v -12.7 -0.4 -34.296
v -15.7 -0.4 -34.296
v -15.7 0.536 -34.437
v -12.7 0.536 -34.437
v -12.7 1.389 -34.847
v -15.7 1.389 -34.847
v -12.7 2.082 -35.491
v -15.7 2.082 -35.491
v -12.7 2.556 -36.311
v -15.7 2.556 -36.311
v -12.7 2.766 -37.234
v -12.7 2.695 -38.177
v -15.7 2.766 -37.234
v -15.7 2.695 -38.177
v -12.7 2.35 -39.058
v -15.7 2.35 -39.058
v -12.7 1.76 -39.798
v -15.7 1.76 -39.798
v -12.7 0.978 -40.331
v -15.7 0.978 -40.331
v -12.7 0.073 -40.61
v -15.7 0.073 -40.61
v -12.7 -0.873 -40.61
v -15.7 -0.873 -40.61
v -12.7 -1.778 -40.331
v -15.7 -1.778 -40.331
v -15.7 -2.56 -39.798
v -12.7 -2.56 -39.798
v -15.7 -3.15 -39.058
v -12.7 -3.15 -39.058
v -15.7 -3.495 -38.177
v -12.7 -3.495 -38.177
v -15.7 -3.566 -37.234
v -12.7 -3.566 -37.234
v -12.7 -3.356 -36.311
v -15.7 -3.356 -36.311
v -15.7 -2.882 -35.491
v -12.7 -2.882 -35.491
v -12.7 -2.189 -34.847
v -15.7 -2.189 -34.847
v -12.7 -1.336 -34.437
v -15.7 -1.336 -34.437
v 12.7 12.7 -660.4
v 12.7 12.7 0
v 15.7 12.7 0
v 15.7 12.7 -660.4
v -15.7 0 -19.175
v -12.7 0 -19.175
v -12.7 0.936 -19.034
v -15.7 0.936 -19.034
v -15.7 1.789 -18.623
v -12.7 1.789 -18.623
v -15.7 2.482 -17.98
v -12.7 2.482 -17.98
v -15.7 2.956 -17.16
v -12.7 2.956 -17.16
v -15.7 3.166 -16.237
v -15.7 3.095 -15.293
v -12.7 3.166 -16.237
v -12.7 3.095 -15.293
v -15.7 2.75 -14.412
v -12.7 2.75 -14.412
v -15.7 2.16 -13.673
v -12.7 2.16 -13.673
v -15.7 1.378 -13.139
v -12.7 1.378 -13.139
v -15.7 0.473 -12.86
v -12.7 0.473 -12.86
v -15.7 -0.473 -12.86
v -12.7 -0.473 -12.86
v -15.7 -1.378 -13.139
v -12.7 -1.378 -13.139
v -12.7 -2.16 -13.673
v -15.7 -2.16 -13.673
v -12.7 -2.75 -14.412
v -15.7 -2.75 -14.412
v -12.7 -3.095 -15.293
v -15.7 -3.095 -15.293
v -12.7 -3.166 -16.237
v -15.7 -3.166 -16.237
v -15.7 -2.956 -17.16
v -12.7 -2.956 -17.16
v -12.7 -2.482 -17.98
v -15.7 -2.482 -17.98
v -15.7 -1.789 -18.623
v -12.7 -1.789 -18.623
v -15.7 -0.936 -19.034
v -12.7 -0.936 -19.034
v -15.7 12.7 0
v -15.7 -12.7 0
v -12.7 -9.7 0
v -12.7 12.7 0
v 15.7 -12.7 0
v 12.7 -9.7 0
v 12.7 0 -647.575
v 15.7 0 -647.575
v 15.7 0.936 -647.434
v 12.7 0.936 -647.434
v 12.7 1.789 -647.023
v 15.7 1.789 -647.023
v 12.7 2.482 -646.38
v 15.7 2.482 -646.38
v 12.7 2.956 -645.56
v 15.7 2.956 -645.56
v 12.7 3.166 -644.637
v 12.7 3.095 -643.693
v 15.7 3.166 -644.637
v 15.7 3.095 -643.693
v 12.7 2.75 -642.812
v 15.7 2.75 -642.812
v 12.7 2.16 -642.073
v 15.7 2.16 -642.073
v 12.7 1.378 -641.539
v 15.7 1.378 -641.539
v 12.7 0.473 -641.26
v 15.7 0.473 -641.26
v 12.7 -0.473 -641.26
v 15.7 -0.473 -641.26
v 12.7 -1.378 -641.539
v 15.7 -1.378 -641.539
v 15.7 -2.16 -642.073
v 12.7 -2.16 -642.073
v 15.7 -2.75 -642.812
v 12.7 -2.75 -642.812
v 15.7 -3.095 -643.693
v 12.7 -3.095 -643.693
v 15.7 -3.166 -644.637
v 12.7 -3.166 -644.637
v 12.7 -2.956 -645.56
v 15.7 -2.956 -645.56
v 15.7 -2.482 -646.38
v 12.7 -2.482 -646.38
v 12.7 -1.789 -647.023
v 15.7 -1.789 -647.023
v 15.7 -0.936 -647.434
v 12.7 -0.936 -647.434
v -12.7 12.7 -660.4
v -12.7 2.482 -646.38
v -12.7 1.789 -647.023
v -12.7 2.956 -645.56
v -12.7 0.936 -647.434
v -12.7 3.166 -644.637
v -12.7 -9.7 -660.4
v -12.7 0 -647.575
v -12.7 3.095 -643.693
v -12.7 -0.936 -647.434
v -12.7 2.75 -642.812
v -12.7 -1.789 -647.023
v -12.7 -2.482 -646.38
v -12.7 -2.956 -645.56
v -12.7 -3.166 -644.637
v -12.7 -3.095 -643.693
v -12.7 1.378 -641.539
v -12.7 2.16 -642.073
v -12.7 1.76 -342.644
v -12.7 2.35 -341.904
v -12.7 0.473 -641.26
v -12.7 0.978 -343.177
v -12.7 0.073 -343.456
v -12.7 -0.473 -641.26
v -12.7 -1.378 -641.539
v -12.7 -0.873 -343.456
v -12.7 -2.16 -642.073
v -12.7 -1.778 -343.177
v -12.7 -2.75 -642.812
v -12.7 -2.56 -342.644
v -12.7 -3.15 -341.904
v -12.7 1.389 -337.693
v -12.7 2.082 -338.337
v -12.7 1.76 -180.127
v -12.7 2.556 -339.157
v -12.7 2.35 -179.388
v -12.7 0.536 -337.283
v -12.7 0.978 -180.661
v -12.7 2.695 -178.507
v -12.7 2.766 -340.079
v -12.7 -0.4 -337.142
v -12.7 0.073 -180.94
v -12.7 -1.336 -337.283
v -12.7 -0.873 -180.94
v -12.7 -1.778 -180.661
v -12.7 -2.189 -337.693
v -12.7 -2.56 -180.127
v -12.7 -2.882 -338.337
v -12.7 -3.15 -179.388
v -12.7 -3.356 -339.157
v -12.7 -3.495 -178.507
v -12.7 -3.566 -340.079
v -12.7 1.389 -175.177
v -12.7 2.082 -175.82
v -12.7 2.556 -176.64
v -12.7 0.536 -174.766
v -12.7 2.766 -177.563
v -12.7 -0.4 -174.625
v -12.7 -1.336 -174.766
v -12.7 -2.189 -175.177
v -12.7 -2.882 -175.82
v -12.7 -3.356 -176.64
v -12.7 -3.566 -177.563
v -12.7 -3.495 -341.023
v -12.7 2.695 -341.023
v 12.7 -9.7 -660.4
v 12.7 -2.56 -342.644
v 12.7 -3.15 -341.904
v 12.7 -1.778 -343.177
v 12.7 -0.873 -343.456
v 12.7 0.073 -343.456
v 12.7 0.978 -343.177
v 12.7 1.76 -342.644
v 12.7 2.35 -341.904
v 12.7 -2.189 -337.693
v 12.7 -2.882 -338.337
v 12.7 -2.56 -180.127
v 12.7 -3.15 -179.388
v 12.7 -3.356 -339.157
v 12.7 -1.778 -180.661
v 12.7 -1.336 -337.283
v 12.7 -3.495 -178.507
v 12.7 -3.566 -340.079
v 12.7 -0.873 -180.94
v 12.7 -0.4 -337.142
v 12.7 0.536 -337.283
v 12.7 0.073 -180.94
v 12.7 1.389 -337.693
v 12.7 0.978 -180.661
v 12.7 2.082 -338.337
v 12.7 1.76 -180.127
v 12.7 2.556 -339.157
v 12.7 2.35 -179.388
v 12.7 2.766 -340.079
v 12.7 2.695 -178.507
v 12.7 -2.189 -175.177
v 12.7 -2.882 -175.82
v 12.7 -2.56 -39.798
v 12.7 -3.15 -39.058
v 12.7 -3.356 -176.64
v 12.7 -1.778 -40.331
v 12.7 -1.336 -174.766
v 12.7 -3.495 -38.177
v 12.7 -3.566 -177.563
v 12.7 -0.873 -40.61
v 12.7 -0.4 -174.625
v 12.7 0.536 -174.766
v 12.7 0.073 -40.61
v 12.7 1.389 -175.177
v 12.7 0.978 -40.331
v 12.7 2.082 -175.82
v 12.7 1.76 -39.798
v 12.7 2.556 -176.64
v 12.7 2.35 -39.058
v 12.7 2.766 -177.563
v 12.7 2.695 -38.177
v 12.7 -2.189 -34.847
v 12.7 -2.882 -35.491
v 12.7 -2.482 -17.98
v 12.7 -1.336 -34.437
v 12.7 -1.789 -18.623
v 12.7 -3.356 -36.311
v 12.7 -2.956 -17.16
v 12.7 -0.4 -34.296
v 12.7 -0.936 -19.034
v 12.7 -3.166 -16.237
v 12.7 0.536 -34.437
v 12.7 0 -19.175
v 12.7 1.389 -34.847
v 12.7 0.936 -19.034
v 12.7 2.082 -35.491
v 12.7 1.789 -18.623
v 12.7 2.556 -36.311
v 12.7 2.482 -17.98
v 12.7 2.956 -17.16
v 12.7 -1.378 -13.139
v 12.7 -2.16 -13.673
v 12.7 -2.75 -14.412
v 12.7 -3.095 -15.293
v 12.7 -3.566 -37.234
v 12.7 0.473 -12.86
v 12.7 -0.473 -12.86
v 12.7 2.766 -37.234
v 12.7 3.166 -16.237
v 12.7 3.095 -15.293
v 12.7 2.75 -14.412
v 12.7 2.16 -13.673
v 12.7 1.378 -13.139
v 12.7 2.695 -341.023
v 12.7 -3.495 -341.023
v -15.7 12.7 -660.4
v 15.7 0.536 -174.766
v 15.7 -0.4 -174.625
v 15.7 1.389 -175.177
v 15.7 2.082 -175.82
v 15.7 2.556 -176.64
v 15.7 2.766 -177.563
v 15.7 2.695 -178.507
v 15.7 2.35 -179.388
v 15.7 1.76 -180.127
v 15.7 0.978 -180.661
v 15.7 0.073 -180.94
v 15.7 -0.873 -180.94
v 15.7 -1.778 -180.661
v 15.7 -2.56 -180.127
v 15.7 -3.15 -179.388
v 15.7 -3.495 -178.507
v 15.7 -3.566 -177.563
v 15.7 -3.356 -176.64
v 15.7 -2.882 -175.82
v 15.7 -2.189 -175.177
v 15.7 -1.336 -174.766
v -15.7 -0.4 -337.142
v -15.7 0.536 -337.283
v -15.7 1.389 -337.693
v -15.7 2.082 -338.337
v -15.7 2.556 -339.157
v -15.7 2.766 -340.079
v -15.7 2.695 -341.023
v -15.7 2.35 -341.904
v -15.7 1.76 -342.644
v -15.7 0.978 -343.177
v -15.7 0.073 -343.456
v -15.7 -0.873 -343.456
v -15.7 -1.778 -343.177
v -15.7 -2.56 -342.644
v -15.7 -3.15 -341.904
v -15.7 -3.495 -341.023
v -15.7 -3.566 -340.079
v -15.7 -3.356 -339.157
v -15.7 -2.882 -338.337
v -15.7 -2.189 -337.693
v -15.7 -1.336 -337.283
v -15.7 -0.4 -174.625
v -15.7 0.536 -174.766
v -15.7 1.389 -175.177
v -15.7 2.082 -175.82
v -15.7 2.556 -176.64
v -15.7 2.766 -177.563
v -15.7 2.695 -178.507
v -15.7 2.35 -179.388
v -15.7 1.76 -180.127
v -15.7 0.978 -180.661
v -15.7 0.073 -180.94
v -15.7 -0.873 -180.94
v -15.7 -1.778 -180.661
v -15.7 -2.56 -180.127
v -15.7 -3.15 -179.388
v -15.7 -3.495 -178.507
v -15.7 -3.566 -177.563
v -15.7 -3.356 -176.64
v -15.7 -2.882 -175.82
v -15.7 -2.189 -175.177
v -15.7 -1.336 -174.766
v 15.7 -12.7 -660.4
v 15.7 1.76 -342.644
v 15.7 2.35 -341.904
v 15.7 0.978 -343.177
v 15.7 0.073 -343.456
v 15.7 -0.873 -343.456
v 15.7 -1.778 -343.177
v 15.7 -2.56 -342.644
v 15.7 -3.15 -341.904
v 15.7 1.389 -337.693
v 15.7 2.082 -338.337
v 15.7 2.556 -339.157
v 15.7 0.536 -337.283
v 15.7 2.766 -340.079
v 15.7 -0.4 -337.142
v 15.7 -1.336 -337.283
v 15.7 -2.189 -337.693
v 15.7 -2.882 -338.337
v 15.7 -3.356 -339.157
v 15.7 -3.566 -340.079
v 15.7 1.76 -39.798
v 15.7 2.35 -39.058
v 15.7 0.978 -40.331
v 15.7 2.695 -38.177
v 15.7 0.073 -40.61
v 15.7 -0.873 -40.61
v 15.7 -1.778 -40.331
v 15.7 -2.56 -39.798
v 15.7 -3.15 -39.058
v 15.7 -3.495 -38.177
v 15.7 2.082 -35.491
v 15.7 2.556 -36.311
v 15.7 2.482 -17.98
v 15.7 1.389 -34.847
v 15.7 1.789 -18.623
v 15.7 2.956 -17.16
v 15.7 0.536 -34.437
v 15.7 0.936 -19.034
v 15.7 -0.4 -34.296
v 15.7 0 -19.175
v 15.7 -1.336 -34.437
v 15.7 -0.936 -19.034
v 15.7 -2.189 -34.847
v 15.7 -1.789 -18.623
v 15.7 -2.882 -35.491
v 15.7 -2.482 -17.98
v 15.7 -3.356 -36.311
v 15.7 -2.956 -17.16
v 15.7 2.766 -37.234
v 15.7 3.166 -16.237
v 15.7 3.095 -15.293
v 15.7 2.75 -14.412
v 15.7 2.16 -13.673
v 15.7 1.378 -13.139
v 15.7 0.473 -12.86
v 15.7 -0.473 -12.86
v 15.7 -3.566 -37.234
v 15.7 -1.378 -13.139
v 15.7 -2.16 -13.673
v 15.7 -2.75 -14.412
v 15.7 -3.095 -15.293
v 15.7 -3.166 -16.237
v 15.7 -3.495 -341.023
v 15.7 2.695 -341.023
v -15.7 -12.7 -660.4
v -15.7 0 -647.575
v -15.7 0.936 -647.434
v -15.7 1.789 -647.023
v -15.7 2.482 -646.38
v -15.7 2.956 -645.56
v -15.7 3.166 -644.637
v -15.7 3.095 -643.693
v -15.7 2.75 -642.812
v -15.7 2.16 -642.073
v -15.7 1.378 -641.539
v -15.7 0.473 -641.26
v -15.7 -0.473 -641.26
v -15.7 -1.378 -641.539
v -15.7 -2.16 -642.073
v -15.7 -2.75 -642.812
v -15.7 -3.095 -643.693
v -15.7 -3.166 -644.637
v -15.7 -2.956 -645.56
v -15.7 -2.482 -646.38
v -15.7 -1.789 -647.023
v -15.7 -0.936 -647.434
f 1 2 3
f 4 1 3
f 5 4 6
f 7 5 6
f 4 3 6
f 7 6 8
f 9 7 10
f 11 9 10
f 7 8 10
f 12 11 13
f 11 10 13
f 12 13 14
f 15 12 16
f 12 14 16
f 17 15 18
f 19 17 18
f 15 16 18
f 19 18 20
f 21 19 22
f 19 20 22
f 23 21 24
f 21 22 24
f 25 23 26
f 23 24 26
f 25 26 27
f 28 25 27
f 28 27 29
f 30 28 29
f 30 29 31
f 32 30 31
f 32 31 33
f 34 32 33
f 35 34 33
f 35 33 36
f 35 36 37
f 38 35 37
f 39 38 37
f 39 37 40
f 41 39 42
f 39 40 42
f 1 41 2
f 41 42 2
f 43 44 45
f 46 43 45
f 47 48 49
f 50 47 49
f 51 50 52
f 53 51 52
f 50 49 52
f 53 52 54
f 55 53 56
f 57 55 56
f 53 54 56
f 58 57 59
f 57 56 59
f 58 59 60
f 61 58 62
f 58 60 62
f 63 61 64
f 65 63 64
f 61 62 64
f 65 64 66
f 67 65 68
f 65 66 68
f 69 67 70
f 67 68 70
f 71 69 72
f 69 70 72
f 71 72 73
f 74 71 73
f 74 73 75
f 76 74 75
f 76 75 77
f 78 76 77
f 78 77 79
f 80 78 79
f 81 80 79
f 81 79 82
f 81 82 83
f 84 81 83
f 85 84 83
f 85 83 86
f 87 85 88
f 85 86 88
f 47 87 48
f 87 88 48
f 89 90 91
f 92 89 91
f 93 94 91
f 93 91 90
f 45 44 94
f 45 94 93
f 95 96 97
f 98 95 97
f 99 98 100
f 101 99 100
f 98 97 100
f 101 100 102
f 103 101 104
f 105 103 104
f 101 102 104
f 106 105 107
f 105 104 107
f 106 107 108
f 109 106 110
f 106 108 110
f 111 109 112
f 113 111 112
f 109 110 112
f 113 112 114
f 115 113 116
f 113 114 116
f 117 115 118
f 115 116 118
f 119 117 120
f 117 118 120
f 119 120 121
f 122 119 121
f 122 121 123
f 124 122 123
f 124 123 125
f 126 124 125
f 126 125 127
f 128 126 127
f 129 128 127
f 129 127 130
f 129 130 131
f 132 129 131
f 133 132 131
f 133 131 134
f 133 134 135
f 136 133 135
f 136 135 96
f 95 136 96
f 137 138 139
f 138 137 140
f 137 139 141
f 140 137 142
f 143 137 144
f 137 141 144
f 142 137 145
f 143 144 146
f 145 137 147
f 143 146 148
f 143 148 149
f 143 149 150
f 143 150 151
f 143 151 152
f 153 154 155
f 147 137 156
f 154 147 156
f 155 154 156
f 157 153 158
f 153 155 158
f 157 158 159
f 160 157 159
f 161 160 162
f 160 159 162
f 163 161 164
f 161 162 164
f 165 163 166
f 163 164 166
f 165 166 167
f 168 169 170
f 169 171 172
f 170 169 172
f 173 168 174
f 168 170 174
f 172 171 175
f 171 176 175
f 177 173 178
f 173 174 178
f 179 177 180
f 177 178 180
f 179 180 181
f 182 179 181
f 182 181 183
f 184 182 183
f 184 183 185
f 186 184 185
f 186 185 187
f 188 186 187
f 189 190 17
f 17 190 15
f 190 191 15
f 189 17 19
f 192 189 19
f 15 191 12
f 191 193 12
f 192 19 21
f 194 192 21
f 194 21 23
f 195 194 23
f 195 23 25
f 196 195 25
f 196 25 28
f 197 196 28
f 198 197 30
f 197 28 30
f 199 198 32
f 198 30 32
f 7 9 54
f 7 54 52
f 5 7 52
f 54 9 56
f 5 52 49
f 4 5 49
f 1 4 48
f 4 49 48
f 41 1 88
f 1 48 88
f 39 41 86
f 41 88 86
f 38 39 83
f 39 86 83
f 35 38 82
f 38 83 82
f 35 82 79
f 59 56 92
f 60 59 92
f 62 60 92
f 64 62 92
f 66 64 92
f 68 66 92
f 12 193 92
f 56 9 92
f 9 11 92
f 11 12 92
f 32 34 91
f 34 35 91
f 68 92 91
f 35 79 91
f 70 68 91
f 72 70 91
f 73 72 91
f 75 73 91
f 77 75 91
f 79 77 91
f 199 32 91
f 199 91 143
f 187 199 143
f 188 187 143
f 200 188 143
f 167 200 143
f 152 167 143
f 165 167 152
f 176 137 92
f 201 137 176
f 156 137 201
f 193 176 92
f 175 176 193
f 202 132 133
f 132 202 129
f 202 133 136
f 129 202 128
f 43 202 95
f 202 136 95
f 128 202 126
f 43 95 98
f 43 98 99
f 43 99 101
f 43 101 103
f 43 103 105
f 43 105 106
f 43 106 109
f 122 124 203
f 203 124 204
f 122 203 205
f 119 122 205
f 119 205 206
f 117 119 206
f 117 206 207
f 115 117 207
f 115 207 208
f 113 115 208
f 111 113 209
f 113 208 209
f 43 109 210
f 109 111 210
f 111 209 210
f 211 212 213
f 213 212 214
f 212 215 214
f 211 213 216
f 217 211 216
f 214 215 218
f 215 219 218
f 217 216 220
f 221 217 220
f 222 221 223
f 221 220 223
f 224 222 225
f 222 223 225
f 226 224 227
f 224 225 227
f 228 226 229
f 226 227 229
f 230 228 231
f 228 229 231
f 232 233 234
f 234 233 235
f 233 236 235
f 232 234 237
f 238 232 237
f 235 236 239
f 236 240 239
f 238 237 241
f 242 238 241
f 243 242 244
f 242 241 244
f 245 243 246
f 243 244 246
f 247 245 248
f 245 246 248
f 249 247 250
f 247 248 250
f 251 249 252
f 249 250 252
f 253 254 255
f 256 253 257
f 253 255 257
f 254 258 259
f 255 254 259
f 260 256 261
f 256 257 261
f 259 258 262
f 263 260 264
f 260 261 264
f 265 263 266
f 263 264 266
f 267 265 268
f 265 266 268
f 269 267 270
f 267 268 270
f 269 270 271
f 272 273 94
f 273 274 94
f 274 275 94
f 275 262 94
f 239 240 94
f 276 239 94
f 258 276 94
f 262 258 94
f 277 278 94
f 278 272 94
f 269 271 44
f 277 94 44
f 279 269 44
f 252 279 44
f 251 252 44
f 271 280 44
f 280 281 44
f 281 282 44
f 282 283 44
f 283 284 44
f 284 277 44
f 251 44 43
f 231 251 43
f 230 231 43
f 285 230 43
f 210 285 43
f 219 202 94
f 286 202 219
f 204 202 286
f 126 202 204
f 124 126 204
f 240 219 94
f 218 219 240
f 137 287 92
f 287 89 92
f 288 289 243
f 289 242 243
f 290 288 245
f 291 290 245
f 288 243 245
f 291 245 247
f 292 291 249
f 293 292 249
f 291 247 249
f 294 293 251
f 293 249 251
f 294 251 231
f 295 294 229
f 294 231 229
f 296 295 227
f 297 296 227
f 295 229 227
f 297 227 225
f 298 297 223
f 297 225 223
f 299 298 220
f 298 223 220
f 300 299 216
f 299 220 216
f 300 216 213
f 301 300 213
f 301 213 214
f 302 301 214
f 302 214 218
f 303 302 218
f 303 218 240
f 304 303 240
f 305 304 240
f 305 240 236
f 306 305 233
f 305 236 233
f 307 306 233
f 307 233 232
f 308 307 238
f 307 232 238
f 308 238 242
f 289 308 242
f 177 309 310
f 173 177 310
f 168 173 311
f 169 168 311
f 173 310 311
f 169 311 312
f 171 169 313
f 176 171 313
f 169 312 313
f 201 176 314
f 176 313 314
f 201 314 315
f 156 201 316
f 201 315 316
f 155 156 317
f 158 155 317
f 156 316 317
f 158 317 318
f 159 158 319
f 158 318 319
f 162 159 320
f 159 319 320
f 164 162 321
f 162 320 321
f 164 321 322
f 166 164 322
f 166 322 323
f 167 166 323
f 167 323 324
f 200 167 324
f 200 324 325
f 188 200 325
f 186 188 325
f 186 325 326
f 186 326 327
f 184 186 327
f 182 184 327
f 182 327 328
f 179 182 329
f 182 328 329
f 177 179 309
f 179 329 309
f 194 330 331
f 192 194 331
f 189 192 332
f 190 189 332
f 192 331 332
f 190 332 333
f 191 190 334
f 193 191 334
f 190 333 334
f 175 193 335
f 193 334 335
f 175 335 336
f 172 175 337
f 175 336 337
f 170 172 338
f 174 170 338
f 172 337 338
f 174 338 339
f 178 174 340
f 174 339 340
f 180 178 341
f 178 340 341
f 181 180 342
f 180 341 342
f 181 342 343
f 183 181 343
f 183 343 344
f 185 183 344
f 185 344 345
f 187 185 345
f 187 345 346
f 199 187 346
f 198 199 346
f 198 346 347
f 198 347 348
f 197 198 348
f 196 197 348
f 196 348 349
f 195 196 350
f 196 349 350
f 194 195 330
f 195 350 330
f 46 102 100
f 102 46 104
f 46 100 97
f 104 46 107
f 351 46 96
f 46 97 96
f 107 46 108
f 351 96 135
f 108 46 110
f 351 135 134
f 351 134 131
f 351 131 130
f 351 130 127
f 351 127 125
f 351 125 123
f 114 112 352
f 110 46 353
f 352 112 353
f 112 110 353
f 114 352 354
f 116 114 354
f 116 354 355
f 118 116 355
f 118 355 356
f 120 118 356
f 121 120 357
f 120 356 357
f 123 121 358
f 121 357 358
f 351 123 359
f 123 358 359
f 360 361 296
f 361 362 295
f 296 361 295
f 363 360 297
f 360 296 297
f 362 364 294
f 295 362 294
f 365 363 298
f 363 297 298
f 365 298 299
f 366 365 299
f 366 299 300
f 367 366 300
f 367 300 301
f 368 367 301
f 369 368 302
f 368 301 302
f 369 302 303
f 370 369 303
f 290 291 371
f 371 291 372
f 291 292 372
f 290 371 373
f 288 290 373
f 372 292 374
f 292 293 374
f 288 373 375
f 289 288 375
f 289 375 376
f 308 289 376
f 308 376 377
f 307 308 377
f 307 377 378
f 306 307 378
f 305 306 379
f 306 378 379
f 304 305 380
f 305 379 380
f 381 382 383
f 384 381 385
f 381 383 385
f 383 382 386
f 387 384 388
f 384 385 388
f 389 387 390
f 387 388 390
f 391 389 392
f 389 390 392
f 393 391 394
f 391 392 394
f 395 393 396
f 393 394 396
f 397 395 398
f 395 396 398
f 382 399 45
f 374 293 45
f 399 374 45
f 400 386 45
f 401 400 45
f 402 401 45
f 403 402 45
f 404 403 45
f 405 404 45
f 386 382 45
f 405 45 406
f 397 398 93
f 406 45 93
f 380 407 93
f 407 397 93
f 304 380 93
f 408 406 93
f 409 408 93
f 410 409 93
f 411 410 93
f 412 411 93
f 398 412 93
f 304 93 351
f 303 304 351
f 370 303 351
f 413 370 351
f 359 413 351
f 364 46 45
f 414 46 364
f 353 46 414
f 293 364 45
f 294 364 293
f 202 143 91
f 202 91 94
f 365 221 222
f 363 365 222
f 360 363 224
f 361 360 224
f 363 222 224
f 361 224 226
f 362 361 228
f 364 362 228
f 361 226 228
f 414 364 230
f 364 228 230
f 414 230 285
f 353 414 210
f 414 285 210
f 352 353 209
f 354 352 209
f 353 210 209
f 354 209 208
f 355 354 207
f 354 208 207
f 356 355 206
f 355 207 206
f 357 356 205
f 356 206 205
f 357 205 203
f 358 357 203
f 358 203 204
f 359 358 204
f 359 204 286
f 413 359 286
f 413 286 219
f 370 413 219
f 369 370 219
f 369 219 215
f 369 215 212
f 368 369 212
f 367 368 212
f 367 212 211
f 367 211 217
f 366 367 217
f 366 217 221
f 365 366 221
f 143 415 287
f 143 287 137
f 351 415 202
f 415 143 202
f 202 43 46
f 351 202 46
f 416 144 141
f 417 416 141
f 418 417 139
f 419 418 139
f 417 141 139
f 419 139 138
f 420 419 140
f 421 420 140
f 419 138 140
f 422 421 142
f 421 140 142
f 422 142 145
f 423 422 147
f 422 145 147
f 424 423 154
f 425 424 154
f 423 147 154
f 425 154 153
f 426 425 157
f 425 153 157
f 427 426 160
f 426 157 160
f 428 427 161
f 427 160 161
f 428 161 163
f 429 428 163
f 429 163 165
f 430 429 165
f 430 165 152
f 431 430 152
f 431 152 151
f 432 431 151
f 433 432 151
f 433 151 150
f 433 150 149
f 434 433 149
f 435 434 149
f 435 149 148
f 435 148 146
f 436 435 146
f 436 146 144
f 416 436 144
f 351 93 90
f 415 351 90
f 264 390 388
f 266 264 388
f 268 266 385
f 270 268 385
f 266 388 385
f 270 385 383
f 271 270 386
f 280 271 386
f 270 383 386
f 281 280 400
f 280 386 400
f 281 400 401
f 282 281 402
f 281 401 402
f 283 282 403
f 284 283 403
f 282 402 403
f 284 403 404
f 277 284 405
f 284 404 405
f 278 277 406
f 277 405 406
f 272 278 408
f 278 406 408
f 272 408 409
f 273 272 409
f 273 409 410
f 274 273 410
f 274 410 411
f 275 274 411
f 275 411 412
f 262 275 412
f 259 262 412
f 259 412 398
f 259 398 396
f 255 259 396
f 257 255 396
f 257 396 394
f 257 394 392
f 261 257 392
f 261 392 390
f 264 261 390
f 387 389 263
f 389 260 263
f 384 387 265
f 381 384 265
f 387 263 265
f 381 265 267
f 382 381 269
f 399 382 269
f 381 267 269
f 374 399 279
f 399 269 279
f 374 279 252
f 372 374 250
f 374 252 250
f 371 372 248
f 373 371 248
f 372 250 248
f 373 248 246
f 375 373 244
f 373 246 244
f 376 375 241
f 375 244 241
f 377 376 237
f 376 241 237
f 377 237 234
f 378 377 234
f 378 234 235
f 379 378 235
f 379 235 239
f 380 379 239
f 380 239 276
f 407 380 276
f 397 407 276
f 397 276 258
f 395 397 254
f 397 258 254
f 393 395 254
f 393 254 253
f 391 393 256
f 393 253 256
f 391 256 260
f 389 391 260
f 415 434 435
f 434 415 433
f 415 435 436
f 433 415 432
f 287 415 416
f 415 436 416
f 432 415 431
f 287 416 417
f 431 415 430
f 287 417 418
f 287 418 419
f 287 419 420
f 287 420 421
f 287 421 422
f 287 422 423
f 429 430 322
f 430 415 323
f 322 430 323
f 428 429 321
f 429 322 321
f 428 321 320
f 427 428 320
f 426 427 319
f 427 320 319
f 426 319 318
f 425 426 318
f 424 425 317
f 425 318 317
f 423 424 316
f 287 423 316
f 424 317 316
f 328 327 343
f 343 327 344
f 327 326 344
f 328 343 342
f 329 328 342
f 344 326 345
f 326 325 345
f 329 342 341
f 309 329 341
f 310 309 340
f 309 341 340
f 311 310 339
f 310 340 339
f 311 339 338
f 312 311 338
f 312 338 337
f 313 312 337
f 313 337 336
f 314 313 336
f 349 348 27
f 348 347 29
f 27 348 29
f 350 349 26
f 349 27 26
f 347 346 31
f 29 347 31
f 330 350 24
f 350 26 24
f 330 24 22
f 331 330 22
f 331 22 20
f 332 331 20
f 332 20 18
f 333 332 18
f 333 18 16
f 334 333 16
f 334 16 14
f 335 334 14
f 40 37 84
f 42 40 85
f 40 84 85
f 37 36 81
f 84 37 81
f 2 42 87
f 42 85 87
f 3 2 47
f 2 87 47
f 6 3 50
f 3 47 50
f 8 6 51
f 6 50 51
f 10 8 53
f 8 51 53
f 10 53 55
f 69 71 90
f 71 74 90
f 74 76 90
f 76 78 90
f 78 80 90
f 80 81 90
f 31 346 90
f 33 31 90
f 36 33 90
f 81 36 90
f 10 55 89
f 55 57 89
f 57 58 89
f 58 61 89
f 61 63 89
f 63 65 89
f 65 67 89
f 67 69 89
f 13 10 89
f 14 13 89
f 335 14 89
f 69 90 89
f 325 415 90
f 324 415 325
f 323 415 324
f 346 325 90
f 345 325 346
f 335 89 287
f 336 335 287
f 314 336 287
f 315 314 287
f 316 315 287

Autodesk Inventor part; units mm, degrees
ref_plane "YZ Plane" through (0, 0, 0) normal (1, 0, 0) x (0, 1, 0)
ref_plane "XZ Plane" through (0, 0, 0) normal (0, 1, 0) x (-1, 0, 0)
ref_plane "XY Plane" through (0, 0, 0) normal (0, 0, 1) x (1, 0, 0)
sketch "Sketch1" plane through (0, 0, 0) normal (0, 0, 1) x (1, 0, 0)
  line L0 (-15.7, 12.7) -> (-12.7, 12.7)
  line L1 (-12.7, 12.7) -> (-12.7, -9.7)
  line L2 (-12.7, -9.7) -> (12.7, -9.7)
  line L3 (12.7, -9.7) -> (12.7, 12.7)
  line L4 (12.7, 12.7) -> (15.7, 12.7)
  line L5 (15.7, 12.7) -> (15.7, -12.7)
  line L6 (15.7, -12.7) -> (-15.7, -12.7)
  line L7 (-15.7, -12.7) -> (-15.7, 12.7)
  point P0 (0, 0)
  dimension "d0" = 3
  dimension "d2" = 3
  dimension "d3" = 25.4
  dimension "d4" = 31.4
  dimension "d5" = 15.7
  dimension "d7" = 12.7
  dimension "d8" = 3
extrude "Extrusion1" add sketch "Sketch1" against normal blind 660.4
sketch "Sketch5" plane through (15.7, -12.7, 0) normal (1, 0, 0) x (0, 0, -1)
  circle A0 centre (16, 12.7) radius 3.175
  circle A1 centre (644.4, 12.7) radius 3.175
  line L0 (0, 25.4) -> (0, 0) projected
  line L1 (660.4, 25.4) -> (660.4, 0) projected
  line L2 (0, 25.4) -> (660.4, 25.4) projected
  point P0 (0, 12.7)
  dimension "d56" = 6.35
  dimension "d65" = 6.35
  dimension "d70" = 16
  dimension "d71" = 25.4
  dimension "d72" = 12.7
  dimension "d73" = 16
extrude "Extrusion5" cut sketch "Sketch5" against normal blind 76.2
sketch "Sketch6" plane through (-15.7, -12.7, 0) normal (-1, 0, 0) x (0, 0, 1)
  circle A0 centre (-37.4708, 12.3) radius 3.175
  circle A1 centre (-177.8, 12.3) radius 3.175
  circle A2 centre (-340.3166, 12.3) radius 3.175
  point P0 (0, 12.7)
extrude "Extrusion6" cut sketch "Sketch6" against normal blind 50.8
equation "\"d2\" = d0"
equation "\"d5\" = 0.5 * d4"
equation "\"d7\" = 0.5 * d3"
equation "\"d8\" = d0"
equation "\"d65\" = d64"
equation "\"d72\" = 0.5 * d71"
equation "\"d73\" = d70"
equation "\"d58\" = d56"
equation "\"d59\" = d58"
equation "\"d60\" = d59"
equation "\"d61\" = d60"
equation "\"d62\" = d61"
equation "\"d63\" = d62"
equation "\"d64\" = d63"
properties part number "26in C-Channel Right" material "Aluminum 6061"
